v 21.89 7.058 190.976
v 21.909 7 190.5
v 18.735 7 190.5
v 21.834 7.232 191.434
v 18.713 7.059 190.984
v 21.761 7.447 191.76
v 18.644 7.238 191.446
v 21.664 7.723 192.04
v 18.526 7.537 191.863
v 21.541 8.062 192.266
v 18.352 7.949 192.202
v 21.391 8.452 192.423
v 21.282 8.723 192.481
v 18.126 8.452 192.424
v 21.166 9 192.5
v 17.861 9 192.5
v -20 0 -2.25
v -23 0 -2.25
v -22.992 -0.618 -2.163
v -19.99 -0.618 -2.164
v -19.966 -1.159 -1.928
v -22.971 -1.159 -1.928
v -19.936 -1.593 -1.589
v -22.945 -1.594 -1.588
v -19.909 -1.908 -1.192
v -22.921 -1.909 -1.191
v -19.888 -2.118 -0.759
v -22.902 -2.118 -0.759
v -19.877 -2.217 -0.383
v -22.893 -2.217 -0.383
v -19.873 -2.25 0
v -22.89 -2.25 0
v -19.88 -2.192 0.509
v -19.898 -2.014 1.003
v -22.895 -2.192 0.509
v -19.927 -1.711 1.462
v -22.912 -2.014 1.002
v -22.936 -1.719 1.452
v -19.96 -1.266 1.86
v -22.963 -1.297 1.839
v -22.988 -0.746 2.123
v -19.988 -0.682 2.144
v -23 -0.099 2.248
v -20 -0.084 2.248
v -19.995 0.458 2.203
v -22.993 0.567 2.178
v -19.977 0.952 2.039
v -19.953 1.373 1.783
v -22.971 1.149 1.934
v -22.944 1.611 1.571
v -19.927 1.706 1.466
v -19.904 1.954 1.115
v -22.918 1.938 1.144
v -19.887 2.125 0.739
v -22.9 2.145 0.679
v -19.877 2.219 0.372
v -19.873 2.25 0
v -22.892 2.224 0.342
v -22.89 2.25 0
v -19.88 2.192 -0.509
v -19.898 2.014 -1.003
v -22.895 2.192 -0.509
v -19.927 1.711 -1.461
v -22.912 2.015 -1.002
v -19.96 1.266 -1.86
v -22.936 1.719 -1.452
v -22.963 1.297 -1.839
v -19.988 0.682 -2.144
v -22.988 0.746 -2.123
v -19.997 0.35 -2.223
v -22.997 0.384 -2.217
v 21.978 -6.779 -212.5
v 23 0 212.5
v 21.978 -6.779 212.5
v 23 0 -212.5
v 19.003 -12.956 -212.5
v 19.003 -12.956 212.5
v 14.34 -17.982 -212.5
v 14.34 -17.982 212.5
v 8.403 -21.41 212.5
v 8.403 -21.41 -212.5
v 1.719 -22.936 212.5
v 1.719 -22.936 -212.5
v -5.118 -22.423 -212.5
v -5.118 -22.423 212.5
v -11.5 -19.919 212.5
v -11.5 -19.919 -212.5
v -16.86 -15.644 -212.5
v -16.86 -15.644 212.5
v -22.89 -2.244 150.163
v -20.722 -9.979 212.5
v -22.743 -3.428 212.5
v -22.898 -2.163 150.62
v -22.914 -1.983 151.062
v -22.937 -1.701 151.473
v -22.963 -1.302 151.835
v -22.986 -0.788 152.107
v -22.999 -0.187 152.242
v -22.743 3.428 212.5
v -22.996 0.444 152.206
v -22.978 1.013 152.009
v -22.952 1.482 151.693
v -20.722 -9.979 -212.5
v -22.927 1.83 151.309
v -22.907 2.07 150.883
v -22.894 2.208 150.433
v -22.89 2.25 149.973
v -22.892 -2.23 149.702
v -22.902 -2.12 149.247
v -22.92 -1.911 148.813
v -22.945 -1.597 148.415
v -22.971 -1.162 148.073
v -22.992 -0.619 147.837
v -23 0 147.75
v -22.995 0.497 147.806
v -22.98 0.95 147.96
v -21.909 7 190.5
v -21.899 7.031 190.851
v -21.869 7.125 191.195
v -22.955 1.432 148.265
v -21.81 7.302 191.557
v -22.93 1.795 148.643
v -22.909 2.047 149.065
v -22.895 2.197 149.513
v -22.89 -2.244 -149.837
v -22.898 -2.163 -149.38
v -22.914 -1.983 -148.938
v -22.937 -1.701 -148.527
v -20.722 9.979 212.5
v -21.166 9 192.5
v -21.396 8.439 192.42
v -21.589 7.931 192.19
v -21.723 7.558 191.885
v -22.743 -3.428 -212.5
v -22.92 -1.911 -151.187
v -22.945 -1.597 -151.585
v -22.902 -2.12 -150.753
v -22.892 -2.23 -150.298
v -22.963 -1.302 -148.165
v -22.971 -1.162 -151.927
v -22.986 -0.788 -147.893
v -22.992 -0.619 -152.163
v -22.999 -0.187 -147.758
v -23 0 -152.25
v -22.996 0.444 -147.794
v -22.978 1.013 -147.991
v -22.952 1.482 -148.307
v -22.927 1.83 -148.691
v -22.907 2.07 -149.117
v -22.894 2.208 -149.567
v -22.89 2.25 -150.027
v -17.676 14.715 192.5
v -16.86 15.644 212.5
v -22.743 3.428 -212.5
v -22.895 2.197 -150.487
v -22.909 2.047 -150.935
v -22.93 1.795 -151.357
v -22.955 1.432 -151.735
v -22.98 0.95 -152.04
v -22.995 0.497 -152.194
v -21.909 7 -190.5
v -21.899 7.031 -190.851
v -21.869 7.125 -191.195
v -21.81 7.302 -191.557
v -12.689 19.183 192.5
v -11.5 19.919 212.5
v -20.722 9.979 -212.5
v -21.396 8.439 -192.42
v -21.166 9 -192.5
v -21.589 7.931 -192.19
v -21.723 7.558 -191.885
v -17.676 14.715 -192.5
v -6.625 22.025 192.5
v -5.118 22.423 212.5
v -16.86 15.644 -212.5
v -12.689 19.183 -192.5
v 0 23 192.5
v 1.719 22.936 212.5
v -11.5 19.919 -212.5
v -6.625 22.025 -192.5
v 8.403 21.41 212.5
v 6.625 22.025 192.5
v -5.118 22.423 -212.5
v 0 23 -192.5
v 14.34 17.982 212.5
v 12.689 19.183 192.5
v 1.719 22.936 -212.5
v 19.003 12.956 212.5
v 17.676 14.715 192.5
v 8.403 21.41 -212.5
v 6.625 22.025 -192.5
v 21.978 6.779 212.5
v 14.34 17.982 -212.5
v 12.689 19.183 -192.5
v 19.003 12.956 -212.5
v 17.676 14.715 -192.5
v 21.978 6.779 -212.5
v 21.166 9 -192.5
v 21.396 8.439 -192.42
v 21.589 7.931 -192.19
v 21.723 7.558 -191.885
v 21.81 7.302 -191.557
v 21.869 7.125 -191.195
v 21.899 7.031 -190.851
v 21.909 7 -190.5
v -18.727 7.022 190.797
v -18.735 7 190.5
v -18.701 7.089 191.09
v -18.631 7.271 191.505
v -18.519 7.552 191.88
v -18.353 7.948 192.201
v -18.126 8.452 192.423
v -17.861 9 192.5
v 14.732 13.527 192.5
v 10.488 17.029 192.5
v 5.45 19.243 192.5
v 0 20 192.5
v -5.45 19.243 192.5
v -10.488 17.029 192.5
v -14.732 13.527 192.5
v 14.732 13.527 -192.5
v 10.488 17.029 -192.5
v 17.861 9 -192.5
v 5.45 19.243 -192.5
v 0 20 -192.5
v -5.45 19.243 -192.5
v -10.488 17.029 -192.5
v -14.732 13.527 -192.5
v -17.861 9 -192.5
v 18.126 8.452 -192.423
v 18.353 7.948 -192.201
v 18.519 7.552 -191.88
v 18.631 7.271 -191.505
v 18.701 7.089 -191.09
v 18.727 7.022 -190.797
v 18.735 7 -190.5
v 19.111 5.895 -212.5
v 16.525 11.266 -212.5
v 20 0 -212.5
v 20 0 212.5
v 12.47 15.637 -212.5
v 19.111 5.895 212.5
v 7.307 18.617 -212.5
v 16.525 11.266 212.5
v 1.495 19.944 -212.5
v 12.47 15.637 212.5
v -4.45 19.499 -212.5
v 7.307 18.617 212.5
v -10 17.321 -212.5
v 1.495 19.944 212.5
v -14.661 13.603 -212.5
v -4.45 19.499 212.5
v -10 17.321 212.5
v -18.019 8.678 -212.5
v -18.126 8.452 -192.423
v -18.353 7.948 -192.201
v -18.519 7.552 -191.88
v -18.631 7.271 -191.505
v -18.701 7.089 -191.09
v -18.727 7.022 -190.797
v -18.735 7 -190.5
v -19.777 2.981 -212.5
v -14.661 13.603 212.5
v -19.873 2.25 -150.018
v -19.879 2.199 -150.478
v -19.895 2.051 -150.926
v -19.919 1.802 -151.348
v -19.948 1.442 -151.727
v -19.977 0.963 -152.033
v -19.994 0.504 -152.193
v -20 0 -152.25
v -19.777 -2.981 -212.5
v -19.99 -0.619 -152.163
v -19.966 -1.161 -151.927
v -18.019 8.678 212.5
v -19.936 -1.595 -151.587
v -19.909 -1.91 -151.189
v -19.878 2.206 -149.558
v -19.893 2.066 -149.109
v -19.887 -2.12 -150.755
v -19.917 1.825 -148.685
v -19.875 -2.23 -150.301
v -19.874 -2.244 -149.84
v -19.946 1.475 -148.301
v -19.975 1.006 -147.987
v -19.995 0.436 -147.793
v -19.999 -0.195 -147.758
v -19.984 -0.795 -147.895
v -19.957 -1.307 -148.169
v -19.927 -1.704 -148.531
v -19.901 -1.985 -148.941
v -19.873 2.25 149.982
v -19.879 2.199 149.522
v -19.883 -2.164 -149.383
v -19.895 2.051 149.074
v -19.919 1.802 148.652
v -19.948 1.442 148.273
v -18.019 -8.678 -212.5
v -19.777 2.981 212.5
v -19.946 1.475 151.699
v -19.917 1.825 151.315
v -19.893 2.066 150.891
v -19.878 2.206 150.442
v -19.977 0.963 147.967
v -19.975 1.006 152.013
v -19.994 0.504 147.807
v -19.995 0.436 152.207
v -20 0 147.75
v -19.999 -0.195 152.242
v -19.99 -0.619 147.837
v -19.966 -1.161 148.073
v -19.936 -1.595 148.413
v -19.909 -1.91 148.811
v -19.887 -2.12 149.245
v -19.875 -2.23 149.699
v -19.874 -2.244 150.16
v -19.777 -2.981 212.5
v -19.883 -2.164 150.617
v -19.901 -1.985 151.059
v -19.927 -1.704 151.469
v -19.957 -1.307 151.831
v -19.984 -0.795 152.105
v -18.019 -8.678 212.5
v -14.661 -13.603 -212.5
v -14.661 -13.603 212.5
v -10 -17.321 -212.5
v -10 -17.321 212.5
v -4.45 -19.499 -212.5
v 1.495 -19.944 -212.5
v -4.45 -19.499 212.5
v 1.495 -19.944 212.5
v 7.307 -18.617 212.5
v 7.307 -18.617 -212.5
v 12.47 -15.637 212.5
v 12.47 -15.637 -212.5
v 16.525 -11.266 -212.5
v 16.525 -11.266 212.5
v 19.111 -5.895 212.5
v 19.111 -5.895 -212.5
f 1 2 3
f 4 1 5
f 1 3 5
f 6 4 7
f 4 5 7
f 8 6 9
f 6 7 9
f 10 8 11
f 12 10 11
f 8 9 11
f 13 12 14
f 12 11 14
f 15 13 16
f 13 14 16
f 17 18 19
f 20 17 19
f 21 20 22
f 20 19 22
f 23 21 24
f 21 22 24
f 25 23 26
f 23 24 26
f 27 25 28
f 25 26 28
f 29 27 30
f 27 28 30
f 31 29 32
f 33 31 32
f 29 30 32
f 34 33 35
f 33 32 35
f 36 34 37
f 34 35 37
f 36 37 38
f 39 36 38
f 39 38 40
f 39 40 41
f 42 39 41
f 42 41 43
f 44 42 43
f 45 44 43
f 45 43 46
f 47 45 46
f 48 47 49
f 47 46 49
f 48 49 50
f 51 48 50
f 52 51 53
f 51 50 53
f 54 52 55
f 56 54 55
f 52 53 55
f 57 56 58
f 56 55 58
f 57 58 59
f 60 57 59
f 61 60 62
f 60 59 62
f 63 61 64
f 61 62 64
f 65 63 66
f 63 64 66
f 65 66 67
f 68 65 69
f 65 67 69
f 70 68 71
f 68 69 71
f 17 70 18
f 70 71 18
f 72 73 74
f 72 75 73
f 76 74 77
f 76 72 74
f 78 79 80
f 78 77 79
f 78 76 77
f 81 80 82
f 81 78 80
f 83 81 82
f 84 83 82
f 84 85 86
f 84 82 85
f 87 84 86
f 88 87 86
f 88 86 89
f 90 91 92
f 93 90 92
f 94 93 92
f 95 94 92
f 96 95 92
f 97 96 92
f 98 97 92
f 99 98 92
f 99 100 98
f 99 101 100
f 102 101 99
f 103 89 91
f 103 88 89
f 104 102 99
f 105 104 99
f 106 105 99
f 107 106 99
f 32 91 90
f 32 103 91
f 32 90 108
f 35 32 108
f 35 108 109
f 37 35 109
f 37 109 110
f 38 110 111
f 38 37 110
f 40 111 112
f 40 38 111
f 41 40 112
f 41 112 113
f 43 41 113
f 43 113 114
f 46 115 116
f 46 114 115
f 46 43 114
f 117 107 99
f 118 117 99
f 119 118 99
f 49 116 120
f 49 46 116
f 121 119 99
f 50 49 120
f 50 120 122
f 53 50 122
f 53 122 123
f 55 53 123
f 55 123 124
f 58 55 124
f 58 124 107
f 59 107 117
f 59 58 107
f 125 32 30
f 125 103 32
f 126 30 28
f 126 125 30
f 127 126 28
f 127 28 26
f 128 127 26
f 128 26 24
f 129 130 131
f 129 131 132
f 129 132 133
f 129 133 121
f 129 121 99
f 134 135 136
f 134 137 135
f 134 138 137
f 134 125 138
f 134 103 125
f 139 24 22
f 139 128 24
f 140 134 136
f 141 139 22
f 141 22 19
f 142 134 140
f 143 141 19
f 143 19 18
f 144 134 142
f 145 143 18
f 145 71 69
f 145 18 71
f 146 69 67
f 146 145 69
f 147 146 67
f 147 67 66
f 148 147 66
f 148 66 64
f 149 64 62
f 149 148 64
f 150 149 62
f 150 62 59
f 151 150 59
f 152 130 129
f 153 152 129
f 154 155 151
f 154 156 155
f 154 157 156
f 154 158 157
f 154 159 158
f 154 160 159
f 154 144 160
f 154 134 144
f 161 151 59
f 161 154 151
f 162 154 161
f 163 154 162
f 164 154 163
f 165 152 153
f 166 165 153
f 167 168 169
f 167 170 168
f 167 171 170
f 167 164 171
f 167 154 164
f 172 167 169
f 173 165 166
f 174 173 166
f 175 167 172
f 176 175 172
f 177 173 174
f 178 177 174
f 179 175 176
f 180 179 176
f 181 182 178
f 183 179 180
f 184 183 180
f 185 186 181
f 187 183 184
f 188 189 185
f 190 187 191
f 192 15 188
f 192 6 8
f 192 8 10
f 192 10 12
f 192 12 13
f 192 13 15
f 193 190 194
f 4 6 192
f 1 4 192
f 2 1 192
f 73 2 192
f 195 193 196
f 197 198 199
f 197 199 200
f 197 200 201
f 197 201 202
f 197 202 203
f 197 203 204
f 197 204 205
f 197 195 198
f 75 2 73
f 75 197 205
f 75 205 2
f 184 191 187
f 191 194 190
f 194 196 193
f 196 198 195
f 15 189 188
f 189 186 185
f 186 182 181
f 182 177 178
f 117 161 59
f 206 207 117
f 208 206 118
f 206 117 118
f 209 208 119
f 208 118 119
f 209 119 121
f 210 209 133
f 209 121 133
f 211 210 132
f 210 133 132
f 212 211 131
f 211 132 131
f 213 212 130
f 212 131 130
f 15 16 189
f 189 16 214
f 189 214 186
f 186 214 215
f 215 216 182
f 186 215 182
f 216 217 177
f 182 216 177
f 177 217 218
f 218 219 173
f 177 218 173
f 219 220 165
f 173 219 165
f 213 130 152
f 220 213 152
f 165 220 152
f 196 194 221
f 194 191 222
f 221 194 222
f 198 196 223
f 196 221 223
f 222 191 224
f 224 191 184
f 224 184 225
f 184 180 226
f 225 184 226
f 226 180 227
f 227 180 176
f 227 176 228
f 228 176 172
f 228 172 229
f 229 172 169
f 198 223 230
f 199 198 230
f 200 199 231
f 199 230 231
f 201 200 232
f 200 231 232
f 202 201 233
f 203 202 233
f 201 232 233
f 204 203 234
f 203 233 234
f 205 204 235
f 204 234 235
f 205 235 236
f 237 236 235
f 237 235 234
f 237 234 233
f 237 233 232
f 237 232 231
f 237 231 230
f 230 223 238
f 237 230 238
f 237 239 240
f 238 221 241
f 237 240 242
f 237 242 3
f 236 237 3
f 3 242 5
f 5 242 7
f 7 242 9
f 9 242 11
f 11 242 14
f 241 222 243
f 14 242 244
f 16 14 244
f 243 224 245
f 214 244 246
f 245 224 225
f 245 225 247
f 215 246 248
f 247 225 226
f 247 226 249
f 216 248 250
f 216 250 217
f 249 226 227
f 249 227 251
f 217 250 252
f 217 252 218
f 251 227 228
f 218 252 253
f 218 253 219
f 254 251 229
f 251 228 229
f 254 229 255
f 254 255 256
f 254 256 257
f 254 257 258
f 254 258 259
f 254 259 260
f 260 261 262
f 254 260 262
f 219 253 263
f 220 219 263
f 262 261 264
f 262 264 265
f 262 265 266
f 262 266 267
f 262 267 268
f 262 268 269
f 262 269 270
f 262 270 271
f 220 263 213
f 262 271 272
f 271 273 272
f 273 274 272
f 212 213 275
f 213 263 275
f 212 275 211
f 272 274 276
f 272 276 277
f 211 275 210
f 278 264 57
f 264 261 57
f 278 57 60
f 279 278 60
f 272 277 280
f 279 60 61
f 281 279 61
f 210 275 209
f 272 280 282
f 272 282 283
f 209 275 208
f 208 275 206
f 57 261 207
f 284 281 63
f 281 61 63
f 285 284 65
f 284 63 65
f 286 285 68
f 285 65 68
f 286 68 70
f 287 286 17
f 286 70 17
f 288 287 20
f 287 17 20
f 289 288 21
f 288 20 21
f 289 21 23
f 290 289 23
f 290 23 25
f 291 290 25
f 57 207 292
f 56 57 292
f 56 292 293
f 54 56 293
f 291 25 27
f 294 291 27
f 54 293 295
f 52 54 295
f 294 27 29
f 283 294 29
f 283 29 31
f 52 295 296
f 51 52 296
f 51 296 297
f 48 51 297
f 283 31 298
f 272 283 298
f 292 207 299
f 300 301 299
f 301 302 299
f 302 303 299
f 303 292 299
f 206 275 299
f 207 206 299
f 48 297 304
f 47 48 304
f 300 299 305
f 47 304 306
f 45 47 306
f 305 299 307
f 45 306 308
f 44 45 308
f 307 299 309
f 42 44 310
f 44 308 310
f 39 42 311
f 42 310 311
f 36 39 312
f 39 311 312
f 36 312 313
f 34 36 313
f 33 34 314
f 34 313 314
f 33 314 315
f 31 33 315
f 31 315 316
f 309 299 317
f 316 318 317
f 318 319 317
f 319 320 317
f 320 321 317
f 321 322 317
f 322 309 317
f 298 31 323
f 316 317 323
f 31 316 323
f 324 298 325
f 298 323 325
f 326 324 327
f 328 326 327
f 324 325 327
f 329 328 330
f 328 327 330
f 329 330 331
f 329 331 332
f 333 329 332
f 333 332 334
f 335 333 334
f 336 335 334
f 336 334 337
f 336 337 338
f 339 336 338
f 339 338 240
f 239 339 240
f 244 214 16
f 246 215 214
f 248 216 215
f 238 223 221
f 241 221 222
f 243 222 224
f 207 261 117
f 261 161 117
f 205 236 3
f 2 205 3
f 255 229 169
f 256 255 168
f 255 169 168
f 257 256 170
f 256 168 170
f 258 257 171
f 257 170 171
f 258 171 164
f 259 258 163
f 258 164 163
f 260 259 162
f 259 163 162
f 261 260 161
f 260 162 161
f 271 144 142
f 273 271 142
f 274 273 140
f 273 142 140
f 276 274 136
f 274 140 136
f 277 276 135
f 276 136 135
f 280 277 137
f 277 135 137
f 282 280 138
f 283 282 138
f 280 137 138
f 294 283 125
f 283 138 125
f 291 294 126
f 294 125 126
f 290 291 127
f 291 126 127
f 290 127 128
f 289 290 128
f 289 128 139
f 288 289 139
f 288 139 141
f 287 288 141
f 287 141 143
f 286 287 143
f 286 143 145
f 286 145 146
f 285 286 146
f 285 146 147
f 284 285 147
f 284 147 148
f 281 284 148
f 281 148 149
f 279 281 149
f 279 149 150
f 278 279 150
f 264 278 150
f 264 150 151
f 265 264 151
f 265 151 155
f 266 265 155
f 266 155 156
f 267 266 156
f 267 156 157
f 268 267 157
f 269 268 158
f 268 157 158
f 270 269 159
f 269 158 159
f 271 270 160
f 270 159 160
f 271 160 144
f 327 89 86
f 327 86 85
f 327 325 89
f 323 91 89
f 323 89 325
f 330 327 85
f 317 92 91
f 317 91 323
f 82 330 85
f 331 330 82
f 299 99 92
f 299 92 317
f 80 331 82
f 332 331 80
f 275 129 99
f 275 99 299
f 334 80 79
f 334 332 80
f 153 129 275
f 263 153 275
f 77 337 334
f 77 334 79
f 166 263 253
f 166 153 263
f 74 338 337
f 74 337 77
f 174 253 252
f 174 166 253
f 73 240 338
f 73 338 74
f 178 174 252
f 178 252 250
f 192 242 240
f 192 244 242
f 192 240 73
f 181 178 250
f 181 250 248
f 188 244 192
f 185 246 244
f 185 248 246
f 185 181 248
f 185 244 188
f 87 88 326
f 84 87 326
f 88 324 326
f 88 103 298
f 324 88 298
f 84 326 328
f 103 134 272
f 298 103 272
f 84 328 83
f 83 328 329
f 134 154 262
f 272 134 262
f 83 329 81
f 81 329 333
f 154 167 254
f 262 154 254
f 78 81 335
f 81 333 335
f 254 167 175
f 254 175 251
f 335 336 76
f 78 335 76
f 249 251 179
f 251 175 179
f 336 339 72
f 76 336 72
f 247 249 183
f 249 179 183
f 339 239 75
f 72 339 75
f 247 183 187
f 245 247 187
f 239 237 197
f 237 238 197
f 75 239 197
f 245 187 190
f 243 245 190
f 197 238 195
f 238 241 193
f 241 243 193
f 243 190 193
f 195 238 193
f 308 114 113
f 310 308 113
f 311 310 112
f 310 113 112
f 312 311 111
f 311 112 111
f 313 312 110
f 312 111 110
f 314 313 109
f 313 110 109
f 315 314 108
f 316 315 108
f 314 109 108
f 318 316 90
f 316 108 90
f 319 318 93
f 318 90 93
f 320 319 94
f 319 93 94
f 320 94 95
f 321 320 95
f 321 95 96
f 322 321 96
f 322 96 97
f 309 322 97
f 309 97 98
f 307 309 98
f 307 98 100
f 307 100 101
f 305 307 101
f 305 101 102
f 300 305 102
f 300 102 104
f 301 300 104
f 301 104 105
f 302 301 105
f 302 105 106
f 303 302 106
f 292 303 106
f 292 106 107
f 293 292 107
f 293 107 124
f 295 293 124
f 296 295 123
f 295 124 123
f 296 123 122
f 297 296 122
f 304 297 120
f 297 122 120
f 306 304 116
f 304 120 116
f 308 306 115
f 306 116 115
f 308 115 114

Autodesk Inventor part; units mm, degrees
ref_plane "YZ Plane" through (0, 0, 0) normal (1, 0, 0) x (0, 1, 0)
ref_plane "XZ Plane" through (0, 0, 0) normal (0, 1, 0) x (-1, 0, 0)
ref_plane "XY Plane" through (0, 0, 0) normal (0, 0, 1) x (1, 0, 0)
sketch "Sketch1" plane through (0, 0, 0) normal (0, 0, 1) x (1, 0, 0)
  circle A0 centre (0, 0) radius 20
  circle A1 centre (0, 0) radius 23
  dimension "d0" = 40
  dimension "d1" = 46
extrude "Extrusion1" add sketch "Sketch1" along normal mid plane 425
sketch "Sketch2" plane through (0, 0, 0) normal (1, 0, 0) x (0, 1, 0)
  line L0 (0, 280) -> (0, -280) projected
  line L1 (-280, 0) -> (280, 0) projected
  point P0 (0, 0)
  point P1 (0, 150)
  point P2 (0, 0)
  point P3 (0, -150)
  dimension "d4" = 150
  dimension "d5" = 150
hole "Hole1" at (0, 0, 150) at (0, 0, 0) at (0, 0, -150) direction (-1, 0, 0) diameter 4.5 end through all clearance for "Flat Head Machine Screw" size "M4" standard "Ansi Metric M Profile"
sketch "Sketch3" plane through (0, 0, 0) normal (1, 0, 0) x (0, 1, 0)
  line L0 (23, -192.5) -> (7, -192.5)
  line L1 (7, -192.5) -> (7, 192.5)
  line L2 (7, 192.5) -> (23, 192.5)
  line L3 (23, 192.5) -> (23, -192.5)
  line L4 (23, 212.5) -> (-23, 212.5) projected
  line L5 (-23, -212.5) -> (23, -212.5) projected
  line L6 (0, 364) -> (0, -364) projected
  point P0 (0, 0)
  dimension "d13" = 20
  dimension "d14" = 20
  dimension "d15" = 7
extrude "Extrusion2" cut sketch "Sketch3" along normal through all both and the other way through all
fillet "Fillet1" radius 2 4 edges at (20.3219, 7, -192.5) (-20.3219, 7, -192.5) (20.3219, 7, 192.5) (-20.3219, 7, 192.5)
equation "\"d5\" = d4"
properties part number "Pancake_Tilt Pipe_4 Lanes" material "PVC-Piping"
